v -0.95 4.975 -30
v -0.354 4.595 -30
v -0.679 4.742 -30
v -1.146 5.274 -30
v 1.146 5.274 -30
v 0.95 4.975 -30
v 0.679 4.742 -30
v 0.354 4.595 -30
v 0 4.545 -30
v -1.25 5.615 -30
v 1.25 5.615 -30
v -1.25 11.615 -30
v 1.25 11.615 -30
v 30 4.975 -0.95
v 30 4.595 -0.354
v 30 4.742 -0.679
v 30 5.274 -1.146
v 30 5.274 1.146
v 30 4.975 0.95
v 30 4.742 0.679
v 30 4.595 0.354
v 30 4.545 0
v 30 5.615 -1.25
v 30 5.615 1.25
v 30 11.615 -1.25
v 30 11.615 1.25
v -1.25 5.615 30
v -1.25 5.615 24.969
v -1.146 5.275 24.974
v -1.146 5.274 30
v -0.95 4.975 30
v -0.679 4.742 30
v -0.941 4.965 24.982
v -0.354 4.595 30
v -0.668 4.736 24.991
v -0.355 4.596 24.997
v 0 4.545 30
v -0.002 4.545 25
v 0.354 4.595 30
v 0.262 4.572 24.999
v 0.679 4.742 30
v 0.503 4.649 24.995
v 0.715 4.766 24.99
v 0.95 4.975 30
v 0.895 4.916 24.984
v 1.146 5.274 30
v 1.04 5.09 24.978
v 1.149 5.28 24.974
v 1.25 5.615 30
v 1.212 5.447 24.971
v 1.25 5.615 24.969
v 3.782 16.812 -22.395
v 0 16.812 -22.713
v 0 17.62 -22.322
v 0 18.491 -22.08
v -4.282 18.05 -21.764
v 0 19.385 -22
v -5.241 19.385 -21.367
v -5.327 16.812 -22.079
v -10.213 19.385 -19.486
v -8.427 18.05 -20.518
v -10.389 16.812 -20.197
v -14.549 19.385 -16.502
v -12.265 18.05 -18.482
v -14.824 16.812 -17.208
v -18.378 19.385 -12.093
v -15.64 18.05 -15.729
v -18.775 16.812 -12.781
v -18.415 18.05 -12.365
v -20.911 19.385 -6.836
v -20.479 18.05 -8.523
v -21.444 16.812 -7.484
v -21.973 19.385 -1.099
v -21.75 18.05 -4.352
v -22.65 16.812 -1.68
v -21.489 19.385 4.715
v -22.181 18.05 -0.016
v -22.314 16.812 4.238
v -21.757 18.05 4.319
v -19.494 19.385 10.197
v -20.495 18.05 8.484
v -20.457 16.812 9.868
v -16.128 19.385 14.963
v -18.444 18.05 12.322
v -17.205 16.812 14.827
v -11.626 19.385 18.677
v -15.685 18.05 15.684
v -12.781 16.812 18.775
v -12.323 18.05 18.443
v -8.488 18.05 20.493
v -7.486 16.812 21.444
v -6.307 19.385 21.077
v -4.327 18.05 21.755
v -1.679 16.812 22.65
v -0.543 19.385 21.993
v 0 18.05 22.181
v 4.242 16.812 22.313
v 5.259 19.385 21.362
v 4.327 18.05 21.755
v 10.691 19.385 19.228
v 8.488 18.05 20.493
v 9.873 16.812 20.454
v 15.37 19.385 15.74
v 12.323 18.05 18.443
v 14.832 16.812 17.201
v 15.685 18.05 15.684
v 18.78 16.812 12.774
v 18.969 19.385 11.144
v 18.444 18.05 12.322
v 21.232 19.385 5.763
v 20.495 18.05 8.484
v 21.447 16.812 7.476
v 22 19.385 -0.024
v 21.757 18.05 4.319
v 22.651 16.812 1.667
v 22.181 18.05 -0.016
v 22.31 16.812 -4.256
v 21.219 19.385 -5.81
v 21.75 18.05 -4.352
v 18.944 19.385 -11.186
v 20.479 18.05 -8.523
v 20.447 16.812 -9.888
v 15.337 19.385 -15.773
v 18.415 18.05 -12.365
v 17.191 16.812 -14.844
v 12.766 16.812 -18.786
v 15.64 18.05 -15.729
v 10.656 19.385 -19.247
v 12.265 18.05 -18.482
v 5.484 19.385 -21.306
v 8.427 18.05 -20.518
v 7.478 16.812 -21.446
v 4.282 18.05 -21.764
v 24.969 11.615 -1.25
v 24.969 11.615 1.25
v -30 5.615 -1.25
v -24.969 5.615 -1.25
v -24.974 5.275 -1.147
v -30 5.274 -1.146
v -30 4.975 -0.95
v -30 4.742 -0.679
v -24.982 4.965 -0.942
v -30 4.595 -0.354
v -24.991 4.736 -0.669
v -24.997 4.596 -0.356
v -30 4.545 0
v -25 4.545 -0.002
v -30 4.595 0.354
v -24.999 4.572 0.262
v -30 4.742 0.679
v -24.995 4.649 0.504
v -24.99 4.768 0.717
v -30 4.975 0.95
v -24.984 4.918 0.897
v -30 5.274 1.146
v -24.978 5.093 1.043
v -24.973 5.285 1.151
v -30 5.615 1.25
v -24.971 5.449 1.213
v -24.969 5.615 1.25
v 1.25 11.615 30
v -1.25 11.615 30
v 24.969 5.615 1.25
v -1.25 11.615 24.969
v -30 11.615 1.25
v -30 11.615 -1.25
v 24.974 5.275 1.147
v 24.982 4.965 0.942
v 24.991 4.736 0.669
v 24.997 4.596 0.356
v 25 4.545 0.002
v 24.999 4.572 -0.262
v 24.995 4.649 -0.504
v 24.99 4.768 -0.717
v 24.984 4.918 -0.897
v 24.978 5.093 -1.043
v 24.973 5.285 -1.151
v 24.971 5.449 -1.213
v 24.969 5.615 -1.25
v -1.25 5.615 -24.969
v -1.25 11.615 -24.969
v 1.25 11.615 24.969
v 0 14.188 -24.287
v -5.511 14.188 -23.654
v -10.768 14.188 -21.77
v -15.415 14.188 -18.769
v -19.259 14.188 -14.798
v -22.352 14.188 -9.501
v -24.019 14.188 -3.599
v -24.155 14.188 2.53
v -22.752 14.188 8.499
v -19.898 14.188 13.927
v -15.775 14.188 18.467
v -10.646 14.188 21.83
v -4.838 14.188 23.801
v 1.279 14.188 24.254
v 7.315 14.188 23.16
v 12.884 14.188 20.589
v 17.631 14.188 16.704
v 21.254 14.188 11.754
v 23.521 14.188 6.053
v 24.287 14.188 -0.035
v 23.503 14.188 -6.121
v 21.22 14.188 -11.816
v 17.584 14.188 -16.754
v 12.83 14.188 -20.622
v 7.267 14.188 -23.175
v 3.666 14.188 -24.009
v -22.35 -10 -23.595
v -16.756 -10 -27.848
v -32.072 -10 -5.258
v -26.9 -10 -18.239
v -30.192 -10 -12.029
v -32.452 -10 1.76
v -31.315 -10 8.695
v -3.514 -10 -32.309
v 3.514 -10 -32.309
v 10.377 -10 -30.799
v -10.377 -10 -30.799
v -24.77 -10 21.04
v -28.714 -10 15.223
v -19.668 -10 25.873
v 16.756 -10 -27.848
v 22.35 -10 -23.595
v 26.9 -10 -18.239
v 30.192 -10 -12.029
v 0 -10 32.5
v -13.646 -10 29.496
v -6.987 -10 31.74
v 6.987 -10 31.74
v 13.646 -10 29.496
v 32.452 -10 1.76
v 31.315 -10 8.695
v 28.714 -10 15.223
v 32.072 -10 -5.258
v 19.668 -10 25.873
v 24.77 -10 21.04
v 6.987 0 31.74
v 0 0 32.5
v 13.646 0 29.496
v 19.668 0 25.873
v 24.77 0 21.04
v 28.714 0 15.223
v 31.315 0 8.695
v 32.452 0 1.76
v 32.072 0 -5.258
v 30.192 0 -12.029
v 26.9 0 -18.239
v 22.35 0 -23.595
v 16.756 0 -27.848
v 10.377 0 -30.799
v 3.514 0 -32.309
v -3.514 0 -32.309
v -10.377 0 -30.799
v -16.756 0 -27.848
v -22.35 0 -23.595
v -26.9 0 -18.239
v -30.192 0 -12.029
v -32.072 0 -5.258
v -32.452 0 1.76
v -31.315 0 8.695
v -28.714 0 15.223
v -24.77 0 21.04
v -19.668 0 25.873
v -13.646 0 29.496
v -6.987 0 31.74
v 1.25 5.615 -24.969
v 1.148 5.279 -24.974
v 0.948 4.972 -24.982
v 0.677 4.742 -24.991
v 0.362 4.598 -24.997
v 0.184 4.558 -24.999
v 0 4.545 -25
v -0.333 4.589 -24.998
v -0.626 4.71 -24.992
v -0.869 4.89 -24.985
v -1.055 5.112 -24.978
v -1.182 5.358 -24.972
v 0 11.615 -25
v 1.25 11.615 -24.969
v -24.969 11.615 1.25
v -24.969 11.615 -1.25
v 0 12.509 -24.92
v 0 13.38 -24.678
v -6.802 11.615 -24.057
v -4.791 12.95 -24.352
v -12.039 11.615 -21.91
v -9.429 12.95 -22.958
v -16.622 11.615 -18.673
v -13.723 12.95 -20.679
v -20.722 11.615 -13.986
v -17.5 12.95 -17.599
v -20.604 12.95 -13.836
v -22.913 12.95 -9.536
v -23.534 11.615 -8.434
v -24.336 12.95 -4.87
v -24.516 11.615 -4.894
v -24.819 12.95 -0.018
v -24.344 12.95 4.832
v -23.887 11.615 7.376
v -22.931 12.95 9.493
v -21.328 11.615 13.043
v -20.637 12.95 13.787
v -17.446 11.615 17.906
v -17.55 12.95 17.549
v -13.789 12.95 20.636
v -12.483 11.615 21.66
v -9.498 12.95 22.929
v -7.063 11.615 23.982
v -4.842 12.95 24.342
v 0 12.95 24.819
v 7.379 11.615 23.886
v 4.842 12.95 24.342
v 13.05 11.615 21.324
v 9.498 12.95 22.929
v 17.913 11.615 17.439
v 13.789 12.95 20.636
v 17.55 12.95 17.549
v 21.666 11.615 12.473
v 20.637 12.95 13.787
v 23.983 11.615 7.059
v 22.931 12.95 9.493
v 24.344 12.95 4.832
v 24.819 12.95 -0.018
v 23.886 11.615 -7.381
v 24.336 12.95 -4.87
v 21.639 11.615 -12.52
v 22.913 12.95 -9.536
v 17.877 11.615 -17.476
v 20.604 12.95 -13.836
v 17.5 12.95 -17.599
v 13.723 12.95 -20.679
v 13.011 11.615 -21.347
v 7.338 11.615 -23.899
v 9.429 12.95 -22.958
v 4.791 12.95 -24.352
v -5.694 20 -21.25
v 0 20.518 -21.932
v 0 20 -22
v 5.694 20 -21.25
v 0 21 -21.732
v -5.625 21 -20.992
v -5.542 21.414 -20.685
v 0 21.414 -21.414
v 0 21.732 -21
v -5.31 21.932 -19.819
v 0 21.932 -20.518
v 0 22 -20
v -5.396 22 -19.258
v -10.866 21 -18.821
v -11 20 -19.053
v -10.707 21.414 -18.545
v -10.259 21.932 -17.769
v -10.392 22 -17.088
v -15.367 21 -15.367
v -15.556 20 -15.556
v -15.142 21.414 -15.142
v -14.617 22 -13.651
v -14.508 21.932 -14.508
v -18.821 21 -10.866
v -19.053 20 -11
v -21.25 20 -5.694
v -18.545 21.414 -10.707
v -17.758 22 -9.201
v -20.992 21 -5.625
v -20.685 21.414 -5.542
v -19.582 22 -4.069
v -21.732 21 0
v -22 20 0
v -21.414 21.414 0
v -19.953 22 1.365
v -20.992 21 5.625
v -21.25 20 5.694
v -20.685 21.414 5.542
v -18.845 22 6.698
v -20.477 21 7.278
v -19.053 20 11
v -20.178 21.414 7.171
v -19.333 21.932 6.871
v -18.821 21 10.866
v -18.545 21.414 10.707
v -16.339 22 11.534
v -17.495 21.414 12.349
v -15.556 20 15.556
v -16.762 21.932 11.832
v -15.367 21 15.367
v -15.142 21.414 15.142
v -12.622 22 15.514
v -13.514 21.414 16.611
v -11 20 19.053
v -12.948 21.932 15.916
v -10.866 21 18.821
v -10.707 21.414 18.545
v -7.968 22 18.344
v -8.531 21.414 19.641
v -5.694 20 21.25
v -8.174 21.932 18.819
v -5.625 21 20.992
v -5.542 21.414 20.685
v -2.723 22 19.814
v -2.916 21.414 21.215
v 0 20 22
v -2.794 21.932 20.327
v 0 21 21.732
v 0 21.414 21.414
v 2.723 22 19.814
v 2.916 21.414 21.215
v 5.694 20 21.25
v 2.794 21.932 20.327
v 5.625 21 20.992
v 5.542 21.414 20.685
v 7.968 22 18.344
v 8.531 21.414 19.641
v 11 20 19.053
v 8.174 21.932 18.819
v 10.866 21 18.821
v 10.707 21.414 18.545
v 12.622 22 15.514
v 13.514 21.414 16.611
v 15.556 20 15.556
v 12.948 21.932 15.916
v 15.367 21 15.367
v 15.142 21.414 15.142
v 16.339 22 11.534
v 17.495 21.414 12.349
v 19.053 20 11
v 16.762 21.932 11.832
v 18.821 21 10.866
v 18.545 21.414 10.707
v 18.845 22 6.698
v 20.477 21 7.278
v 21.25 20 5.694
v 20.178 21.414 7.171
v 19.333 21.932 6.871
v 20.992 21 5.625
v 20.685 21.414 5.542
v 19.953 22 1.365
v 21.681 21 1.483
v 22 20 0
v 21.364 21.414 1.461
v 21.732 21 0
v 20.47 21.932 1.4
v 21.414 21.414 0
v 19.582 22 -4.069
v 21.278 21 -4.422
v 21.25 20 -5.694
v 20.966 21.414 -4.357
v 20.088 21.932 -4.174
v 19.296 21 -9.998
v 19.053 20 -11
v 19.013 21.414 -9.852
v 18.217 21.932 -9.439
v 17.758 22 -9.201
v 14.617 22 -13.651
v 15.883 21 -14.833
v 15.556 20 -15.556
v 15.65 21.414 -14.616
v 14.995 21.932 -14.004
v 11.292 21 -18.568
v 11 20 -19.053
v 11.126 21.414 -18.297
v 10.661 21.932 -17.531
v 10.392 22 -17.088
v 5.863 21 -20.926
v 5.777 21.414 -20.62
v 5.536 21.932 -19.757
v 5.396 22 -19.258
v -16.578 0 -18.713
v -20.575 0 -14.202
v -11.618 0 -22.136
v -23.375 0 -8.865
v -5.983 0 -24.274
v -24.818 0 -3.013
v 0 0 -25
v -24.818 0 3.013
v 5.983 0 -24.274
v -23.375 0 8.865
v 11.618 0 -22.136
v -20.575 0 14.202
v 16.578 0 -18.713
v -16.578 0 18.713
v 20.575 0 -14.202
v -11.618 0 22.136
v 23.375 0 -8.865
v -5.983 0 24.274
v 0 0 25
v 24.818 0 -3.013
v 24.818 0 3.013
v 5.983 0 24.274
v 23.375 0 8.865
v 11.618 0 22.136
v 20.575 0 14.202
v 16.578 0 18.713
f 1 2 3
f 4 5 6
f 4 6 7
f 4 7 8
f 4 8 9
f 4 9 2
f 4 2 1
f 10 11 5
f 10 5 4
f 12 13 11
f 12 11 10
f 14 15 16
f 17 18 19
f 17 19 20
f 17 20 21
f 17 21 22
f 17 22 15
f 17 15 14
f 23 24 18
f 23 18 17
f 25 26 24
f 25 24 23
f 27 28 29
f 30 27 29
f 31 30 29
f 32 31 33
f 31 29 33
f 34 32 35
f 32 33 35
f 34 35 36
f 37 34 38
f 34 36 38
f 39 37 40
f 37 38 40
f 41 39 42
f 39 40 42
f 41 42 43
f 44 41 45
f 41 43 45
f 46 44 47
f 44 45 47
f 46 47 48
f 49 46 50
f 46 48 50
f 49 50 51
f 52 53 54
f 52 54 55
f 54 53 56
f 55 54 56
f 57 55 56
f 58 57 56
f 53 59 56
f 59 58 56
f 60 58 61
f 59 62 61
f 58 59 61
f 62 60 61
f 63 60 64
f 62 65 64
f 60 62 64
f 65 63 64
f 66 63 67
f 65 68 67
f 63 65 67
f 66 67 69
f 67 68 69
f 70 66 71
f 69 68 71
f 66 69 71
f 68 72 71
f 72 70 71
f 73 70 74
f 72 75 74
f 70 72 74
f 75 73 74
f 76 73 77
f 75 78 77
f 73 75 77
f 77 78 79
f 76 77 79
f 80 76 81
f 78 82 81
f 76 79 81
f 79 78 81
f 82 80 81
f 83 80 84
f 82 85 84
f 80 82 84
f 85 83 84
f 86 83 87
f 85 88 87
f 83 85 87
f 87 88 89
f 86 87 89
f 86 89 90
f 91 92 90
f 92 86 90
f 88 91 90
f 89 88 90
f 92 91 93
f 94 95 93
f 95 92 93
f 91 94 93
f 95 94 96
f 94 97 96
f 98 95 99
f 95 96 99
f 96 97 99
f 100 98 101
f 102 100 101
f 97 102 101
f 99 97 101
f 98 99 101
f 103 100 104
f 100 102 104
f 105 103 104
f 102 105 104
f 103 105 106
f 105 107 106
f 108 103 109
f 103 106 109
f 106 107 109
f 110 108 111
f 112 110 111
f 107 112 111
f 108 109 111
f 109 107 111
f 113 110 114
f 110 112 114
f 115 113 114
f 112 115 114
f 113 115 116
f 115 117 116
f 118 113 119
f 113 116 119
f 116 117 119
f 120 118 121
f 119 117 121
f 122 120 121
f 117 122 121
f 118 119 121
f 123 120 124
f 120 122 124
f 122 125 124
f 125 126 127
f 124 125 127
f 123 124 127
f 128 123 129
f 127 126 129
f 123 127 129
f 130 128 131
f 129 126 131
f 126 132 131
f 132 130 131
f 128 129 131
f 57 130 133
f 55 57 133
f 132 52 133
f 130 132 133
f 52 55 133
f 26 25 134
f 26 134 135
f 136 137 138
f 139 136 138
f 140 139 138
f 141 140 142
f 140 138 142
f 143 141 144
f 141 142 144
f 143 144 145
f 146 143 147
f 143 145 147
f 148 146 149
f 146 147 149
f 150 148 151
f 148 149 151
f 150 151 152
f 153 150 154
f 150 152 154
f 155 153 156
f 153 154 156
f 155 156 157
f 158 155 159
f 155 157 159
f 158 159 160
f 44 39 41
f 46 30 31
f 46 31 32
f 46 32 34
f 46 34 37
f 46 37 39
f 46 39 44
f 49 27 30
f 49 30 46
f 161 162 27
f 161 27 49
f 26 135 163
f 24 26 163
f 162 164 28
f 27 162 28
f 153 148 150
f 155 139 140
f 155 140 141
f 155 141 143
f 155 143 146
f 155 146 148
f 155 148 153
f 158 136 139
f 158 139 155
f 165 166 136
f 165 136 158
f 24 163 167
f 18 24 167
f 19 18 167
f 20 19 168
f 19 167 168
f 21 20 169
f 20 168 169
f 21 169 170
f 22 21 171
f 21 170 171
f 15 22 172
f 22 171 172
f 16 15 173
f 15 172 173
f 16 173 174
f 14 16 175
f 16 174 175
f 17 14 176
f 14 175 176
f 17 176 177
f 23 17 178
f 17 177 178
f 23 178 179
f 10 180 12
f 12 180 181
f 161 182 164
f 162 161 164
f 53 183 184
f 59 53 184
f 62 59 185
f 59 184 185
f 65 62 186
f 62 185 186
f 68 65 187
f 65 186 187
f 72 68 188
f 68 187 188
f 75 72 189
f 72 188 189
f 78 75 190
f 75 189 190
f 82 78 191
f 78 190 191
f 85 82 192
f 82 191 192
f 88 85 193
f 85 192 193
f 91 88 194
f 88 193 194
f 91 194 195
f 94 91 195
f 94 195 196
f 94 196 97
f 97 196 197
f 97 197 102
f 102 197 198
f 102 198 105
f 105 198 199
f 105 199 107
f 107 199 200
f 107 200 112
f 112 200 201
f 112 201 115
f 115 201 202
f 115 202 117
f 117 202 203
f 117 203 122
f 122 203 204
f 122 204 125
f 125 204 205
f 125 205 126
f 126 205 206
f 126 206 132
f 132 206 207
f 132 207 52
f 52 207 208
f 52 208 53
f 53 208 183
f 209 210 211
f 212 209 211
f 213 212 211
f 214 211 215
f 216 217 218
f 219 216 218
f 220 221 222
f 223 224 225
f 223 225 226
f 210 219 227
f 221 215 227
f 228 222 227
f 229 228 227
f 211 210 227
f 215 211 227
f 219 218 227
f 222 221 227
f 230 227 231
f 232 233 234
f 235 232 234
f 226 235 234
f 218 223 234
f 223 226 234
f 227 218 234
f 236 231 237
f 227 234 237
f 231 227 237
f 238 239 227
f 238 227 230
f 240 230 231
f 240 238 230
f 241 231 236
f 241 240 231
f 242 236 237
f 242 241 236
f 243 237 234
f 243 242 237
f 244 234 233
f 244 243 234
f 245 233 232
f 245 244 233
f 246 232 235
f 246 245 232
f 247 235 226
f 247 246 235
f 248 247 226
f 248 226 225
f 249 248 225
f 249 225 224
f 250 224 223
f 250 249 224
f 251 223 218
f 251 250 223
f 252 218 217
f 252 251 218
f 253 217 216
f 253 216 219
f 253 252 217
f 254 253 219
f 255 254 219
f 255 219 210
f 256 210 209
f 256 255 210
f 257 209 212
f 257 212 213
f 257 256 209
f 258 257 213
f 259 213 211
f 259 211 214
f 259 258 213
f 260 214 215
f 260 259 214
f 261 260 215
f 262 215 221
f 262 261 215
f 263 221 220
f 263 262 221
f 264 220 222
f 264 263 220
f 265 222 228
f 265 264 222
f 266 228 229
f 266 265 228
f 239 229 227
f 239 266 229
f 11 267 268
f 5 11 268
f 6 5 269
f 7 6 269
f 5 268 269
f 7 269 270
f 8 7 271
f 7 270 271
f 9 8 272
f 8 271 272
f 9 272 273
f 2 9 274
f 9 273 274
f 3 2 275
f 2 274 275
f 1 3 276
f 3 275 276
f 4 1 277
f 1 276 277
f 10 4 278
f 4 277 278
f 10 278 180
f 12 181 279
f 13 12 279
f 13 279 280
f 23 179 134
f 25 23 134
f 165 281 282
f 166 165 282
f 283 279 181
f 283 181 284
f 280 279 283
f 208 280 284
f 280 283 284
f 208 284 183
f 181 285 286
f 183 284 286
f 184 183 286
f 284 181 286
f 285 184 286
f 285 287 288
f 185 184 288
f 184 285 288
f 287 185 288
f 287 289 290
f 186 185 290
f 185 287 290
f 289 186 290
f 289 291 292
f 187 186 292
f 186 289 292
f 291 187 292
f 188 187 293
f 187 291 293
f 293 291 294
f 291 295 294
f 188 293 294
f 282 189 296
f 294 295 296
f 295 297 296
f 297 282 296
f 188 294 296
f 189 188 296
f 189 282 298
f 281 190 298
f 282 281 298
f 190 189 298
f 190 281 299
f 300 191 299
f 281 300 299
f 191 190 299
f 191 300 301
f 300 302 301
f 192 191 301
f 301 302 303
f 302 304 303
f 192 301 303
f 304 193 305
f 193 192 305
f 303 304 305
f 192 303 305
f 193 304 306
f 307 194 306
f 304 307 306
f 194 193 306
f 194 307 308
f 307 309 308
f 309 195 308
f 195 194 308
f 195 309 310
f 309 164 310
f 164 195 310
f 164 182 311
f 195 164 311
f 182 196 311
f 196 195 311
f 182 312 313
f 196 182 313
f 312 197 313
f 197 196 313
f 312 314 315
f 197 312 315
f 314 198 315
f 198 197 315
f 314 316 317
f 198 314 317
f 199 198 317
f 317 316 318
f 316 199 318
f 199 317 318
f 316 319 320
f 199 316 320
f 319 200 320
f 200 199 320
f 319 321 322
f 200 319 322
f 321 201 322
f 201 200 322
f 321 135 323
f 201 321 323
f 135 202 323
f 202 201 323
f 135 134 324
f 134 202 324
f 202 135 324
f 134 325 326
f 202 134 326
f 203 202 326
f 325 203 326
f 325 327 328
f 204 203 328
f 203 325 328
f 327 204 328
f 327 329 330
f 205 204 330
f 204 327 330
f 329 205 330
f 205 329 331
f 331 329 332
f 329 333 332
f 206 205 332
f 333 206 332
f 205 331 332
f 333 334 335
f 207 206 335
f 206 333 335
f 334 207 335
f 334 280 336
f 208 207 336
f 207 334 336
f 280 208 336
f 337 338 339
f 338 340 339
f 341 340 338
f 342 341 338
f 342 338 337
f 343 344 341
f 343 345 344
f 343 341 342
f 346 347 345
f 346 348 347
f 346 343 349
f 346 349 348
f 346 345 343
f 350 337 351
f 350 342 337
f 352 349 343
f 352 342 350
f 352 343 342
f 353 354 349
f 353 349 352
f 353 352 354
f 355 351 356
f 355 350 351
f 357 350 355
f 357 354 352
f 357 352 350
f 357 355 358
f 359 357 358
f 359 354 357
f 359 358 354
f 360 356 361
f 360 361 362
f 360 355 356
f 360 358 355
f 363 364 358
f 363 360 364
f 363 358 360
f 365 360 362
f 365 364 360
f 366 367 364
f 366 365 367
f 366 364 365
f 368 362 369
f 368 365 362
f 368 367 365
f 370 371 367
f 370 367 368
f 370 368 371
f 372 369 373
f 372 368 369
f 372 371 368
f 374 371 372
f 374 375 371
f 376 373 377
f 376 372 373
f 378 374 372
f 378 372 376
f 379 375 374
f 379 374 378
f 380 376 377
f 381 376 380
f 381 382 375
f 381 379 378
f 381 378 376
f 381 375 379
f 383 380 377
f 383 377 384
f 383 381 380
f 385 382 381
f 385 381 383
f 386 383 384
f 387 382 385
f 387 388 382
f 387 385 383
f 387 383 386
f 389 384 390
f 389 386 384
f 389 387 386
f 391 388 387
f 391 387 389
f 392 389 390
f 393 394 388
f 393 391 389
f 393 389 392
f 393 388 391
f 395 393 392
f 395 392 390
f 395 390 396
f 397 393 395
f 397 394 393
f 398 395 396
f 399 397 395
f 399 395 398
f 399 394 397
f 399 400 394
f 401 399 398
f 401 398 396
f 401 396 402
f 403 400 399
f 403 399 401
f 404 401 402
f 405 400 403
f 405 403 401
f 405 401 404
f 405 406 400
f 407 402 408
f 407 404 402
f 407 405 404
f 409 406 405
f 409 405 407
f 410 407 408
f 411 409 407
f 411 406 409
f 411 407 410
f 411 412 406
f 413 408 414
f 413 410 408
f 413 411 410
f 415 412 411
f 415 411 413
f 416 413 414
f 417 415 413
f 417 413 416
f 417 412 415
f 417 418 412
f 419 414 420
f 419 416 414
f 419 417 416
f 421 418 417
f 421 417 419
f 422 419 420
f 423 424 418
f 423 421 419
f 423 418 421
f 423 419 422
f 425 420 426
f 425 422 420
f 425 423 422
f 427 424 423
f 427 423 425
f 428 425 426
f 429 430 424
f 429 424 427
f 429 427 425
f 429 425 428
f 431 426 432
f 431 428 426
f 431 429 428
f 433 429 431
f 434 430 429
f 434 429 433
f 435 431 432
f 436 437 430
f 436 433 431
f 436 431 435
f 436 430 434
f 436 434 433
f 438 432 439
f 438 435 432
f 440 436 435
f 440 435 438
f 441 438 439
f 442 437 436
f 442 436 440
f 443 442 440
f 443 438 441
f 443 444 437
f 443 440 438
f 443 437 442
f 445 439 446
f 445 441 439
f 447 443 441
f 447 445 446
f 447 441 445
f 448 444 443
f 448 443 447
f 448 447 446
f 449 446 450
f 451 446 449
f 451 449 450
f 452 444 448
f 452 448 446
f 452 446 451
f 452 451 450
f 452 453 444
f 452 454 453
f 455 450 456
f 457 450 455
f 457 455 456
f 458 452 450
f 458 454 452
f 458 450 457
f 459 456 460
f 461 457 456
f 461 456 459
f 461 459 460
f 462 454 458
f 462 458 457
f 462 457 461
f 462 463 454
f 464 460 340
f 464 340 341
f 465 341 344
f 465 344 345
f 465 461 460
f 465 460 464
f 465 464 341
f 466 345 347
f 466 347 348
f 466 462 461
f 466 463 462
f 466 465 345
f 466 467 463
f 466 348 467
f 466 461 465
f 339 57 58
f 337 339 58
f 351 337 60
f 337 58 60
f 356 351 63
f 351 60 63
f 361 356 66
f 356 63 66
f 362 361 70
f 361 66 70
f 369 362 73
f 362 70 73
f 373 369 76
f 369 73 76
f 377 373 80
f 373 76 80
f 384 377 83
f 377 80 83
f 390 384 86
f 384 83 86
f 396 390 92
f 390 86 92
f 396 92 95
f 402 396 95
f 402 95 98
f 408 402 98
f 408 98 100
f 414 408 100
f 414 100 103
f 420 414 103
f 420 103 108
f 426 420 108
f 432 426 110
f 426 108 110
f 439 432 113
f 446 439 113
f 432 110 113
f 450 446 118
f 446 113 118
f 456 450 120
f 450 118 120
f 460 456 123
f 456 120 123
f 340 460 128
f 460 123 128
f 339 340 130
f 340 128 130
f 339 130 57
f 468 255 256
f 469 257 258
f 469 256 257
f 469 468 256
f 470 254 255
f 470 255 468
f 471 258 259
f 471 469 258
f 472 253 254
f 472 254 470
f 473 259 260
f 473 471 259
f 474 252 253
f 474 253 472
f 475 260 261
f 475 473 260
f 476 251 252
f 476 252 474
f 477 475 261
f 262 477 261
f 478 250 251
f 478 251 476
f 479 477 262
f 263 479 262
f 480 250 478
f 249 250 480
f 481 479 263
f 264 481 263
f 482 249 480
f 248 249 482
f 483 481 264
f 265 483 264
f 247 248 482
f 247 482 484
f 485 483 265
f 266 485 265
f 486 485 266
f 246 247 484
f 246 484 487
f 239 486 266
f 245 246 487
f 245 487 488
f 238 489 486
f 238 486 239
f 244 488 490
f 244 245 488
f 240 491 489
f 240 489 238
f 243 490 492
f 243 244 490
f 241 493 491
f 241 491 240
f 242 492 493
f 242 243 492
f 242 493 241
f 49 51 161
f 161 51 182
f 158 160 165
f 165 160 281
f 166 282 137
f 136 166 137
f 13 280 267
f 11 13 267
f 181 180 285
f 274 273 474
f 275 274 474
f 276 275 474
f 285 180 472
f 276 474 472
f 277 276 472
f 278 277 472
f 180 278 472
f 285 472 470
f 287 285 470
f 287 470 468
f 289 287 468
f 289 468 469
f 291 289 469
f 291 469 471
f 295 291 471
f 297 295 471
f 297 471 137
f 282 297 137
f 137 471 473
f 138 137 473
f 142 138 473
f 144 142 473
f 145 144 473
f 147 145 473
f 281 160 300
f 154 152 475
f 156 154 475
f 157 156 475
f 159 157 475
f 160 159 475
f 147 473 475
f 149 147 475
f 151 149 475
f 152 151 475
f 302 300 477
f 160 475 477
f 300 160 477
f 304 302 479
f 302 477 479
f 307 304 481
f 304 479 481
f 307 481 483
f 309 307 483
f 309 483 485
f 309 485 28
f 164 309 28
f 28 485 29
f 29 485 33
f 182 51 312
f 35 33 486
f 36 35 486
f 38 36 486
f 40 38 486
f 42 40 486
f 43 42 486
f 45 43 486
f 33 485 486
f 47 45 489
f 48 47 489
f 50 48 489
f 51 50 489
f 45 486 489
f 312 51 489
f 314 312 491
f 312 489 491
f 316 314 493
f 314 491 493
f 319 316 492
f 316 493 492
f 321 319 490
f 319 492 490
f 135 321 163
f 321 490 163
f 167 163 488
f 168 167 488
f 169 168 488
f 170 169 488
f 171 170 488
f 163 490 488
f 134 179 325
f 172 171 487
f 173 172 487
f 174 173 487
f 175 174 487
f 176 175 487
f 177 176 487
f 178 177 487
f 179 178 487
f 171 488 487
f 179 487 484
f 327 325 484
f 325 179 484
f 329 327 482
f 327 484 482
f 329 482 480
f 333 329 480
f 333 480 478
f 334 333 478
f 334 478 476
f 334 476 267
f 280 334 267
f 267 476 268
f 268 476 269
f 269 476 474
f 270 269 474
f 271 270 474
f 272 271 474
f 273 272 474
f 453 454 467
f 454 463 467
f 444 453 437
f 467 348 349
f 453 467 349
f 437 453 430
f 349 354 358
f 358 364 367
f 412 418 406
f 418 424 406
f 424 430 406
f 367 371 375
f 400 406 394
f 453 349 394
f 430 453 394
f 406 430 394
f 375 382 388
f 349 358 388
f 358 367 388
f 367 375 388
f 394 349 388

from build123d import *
from OCP.BRepFilletAPI import BRepFilletAPI_MakeFillet

# Parameters (mm, degrees)
SKETCH1_R           = 32.5
BOSS_EXTRUDE1_DEPTH = 10
FILLET1_R1          = 5
FILLET1_R2          = 2
BOSS_EXTRUDE2_DEPTH = 30
CIRPATTERN1_COUNT   = 4


with BuildPart() as part:
    # Sketch1 → Boss-Extrude1 (new body)
    with BuildSketch(Plane(origin=(0, 0, 0), x_dir=(1, 0, 0), z_dir=(0, 1, 0))):
        with Locations(Location((0, 0, 0), (0, 0, 270))):
            Circle(SKETCH1_R)
    boss_extrude1 = extrude(amount=-BOSS_EXTRUDE1_DEPTH)

    # Sketch2 → Revolve1 (revolve)
    with BuildSketch(Plane(origin=(0, 0, 0), x_dir=(0, 0, -1), z_dir=(1, 0, 0))):
        Polygon((0, 0), (0, 22), (22, 22), (22, 18), (25, 13), (25, 0), align=None)
    revolve(axis=Axis((0, 0, 0), (0, 1, 0)))

    # Fillet1: one fillet with a radius per group of edges: ONE call of the kernel's fillet builder (fillet() takes one radius for all edges)
    fillet1_edges_1 = [part.edges().sort_by_distance(p)[0] for p in [
        (0, 18, 22),
        (0, 13, 25),
    ]]
    fillet1_edges_2 = [part.edges().sort_by_distance(p)[0] for p in [
        (0, 22, 22),
    ]]
    fillet1 = BRepFilletAPI_MakeFillet(part.part.solid().wrapped)
    for e in fillet1_edges_1:
        fillet1.Add(FILLET1_R1, e.wrapped)
    for e in fillet1_edges_2:
        fillet1.Add(FILLET1_R2, e.wrapped)
    add(Compound.cast(fillet1.Shape()), mode=Mode.REPLACE)

    # Sketch3 → Boss-Extrude2 (add)
    with BuildSketch(Plane(origin=(0, 0, 0), x_dir=(0, 0, -1), z_dir=(1, 0, 0))):
        with BuildLine():
            Line((1.25, 11.615080175), (-1.25, 11.615080175))
            Line((-1.25, 11.615080175), (-1.25, 5.615080175))
            ThreePointArc((-1.25, 5.615080175), (0, 4.544871187), (1.25, 5.615080175))
            Line((1.25, 5.615080175), (1.25, 11.615080175))
        make_face()
    boss_extrude2 = extrude(amount=BOSS_EXTRUDE2_DEPTH)

    # CirPattern1: Boss-Extrude1, Boss-Extrude2 ×4 about axis
    cirpattern1_axis = Axis((0, 0, 0), (0, 1, 0))
    add([boss_extrude1.rotate(cirpattern1_axis, i * 360 / CIRPATTERN1_COUNT) for i in range(1, CIRPATTERN1_COUNT)])
    add([boss_extrude2.rotate(cirpattern1_axis, i * 360 / CIRPATTERN1_COUNT) for i in range(1, CIRPATTERN1_COUNT)])


solid = part.part
